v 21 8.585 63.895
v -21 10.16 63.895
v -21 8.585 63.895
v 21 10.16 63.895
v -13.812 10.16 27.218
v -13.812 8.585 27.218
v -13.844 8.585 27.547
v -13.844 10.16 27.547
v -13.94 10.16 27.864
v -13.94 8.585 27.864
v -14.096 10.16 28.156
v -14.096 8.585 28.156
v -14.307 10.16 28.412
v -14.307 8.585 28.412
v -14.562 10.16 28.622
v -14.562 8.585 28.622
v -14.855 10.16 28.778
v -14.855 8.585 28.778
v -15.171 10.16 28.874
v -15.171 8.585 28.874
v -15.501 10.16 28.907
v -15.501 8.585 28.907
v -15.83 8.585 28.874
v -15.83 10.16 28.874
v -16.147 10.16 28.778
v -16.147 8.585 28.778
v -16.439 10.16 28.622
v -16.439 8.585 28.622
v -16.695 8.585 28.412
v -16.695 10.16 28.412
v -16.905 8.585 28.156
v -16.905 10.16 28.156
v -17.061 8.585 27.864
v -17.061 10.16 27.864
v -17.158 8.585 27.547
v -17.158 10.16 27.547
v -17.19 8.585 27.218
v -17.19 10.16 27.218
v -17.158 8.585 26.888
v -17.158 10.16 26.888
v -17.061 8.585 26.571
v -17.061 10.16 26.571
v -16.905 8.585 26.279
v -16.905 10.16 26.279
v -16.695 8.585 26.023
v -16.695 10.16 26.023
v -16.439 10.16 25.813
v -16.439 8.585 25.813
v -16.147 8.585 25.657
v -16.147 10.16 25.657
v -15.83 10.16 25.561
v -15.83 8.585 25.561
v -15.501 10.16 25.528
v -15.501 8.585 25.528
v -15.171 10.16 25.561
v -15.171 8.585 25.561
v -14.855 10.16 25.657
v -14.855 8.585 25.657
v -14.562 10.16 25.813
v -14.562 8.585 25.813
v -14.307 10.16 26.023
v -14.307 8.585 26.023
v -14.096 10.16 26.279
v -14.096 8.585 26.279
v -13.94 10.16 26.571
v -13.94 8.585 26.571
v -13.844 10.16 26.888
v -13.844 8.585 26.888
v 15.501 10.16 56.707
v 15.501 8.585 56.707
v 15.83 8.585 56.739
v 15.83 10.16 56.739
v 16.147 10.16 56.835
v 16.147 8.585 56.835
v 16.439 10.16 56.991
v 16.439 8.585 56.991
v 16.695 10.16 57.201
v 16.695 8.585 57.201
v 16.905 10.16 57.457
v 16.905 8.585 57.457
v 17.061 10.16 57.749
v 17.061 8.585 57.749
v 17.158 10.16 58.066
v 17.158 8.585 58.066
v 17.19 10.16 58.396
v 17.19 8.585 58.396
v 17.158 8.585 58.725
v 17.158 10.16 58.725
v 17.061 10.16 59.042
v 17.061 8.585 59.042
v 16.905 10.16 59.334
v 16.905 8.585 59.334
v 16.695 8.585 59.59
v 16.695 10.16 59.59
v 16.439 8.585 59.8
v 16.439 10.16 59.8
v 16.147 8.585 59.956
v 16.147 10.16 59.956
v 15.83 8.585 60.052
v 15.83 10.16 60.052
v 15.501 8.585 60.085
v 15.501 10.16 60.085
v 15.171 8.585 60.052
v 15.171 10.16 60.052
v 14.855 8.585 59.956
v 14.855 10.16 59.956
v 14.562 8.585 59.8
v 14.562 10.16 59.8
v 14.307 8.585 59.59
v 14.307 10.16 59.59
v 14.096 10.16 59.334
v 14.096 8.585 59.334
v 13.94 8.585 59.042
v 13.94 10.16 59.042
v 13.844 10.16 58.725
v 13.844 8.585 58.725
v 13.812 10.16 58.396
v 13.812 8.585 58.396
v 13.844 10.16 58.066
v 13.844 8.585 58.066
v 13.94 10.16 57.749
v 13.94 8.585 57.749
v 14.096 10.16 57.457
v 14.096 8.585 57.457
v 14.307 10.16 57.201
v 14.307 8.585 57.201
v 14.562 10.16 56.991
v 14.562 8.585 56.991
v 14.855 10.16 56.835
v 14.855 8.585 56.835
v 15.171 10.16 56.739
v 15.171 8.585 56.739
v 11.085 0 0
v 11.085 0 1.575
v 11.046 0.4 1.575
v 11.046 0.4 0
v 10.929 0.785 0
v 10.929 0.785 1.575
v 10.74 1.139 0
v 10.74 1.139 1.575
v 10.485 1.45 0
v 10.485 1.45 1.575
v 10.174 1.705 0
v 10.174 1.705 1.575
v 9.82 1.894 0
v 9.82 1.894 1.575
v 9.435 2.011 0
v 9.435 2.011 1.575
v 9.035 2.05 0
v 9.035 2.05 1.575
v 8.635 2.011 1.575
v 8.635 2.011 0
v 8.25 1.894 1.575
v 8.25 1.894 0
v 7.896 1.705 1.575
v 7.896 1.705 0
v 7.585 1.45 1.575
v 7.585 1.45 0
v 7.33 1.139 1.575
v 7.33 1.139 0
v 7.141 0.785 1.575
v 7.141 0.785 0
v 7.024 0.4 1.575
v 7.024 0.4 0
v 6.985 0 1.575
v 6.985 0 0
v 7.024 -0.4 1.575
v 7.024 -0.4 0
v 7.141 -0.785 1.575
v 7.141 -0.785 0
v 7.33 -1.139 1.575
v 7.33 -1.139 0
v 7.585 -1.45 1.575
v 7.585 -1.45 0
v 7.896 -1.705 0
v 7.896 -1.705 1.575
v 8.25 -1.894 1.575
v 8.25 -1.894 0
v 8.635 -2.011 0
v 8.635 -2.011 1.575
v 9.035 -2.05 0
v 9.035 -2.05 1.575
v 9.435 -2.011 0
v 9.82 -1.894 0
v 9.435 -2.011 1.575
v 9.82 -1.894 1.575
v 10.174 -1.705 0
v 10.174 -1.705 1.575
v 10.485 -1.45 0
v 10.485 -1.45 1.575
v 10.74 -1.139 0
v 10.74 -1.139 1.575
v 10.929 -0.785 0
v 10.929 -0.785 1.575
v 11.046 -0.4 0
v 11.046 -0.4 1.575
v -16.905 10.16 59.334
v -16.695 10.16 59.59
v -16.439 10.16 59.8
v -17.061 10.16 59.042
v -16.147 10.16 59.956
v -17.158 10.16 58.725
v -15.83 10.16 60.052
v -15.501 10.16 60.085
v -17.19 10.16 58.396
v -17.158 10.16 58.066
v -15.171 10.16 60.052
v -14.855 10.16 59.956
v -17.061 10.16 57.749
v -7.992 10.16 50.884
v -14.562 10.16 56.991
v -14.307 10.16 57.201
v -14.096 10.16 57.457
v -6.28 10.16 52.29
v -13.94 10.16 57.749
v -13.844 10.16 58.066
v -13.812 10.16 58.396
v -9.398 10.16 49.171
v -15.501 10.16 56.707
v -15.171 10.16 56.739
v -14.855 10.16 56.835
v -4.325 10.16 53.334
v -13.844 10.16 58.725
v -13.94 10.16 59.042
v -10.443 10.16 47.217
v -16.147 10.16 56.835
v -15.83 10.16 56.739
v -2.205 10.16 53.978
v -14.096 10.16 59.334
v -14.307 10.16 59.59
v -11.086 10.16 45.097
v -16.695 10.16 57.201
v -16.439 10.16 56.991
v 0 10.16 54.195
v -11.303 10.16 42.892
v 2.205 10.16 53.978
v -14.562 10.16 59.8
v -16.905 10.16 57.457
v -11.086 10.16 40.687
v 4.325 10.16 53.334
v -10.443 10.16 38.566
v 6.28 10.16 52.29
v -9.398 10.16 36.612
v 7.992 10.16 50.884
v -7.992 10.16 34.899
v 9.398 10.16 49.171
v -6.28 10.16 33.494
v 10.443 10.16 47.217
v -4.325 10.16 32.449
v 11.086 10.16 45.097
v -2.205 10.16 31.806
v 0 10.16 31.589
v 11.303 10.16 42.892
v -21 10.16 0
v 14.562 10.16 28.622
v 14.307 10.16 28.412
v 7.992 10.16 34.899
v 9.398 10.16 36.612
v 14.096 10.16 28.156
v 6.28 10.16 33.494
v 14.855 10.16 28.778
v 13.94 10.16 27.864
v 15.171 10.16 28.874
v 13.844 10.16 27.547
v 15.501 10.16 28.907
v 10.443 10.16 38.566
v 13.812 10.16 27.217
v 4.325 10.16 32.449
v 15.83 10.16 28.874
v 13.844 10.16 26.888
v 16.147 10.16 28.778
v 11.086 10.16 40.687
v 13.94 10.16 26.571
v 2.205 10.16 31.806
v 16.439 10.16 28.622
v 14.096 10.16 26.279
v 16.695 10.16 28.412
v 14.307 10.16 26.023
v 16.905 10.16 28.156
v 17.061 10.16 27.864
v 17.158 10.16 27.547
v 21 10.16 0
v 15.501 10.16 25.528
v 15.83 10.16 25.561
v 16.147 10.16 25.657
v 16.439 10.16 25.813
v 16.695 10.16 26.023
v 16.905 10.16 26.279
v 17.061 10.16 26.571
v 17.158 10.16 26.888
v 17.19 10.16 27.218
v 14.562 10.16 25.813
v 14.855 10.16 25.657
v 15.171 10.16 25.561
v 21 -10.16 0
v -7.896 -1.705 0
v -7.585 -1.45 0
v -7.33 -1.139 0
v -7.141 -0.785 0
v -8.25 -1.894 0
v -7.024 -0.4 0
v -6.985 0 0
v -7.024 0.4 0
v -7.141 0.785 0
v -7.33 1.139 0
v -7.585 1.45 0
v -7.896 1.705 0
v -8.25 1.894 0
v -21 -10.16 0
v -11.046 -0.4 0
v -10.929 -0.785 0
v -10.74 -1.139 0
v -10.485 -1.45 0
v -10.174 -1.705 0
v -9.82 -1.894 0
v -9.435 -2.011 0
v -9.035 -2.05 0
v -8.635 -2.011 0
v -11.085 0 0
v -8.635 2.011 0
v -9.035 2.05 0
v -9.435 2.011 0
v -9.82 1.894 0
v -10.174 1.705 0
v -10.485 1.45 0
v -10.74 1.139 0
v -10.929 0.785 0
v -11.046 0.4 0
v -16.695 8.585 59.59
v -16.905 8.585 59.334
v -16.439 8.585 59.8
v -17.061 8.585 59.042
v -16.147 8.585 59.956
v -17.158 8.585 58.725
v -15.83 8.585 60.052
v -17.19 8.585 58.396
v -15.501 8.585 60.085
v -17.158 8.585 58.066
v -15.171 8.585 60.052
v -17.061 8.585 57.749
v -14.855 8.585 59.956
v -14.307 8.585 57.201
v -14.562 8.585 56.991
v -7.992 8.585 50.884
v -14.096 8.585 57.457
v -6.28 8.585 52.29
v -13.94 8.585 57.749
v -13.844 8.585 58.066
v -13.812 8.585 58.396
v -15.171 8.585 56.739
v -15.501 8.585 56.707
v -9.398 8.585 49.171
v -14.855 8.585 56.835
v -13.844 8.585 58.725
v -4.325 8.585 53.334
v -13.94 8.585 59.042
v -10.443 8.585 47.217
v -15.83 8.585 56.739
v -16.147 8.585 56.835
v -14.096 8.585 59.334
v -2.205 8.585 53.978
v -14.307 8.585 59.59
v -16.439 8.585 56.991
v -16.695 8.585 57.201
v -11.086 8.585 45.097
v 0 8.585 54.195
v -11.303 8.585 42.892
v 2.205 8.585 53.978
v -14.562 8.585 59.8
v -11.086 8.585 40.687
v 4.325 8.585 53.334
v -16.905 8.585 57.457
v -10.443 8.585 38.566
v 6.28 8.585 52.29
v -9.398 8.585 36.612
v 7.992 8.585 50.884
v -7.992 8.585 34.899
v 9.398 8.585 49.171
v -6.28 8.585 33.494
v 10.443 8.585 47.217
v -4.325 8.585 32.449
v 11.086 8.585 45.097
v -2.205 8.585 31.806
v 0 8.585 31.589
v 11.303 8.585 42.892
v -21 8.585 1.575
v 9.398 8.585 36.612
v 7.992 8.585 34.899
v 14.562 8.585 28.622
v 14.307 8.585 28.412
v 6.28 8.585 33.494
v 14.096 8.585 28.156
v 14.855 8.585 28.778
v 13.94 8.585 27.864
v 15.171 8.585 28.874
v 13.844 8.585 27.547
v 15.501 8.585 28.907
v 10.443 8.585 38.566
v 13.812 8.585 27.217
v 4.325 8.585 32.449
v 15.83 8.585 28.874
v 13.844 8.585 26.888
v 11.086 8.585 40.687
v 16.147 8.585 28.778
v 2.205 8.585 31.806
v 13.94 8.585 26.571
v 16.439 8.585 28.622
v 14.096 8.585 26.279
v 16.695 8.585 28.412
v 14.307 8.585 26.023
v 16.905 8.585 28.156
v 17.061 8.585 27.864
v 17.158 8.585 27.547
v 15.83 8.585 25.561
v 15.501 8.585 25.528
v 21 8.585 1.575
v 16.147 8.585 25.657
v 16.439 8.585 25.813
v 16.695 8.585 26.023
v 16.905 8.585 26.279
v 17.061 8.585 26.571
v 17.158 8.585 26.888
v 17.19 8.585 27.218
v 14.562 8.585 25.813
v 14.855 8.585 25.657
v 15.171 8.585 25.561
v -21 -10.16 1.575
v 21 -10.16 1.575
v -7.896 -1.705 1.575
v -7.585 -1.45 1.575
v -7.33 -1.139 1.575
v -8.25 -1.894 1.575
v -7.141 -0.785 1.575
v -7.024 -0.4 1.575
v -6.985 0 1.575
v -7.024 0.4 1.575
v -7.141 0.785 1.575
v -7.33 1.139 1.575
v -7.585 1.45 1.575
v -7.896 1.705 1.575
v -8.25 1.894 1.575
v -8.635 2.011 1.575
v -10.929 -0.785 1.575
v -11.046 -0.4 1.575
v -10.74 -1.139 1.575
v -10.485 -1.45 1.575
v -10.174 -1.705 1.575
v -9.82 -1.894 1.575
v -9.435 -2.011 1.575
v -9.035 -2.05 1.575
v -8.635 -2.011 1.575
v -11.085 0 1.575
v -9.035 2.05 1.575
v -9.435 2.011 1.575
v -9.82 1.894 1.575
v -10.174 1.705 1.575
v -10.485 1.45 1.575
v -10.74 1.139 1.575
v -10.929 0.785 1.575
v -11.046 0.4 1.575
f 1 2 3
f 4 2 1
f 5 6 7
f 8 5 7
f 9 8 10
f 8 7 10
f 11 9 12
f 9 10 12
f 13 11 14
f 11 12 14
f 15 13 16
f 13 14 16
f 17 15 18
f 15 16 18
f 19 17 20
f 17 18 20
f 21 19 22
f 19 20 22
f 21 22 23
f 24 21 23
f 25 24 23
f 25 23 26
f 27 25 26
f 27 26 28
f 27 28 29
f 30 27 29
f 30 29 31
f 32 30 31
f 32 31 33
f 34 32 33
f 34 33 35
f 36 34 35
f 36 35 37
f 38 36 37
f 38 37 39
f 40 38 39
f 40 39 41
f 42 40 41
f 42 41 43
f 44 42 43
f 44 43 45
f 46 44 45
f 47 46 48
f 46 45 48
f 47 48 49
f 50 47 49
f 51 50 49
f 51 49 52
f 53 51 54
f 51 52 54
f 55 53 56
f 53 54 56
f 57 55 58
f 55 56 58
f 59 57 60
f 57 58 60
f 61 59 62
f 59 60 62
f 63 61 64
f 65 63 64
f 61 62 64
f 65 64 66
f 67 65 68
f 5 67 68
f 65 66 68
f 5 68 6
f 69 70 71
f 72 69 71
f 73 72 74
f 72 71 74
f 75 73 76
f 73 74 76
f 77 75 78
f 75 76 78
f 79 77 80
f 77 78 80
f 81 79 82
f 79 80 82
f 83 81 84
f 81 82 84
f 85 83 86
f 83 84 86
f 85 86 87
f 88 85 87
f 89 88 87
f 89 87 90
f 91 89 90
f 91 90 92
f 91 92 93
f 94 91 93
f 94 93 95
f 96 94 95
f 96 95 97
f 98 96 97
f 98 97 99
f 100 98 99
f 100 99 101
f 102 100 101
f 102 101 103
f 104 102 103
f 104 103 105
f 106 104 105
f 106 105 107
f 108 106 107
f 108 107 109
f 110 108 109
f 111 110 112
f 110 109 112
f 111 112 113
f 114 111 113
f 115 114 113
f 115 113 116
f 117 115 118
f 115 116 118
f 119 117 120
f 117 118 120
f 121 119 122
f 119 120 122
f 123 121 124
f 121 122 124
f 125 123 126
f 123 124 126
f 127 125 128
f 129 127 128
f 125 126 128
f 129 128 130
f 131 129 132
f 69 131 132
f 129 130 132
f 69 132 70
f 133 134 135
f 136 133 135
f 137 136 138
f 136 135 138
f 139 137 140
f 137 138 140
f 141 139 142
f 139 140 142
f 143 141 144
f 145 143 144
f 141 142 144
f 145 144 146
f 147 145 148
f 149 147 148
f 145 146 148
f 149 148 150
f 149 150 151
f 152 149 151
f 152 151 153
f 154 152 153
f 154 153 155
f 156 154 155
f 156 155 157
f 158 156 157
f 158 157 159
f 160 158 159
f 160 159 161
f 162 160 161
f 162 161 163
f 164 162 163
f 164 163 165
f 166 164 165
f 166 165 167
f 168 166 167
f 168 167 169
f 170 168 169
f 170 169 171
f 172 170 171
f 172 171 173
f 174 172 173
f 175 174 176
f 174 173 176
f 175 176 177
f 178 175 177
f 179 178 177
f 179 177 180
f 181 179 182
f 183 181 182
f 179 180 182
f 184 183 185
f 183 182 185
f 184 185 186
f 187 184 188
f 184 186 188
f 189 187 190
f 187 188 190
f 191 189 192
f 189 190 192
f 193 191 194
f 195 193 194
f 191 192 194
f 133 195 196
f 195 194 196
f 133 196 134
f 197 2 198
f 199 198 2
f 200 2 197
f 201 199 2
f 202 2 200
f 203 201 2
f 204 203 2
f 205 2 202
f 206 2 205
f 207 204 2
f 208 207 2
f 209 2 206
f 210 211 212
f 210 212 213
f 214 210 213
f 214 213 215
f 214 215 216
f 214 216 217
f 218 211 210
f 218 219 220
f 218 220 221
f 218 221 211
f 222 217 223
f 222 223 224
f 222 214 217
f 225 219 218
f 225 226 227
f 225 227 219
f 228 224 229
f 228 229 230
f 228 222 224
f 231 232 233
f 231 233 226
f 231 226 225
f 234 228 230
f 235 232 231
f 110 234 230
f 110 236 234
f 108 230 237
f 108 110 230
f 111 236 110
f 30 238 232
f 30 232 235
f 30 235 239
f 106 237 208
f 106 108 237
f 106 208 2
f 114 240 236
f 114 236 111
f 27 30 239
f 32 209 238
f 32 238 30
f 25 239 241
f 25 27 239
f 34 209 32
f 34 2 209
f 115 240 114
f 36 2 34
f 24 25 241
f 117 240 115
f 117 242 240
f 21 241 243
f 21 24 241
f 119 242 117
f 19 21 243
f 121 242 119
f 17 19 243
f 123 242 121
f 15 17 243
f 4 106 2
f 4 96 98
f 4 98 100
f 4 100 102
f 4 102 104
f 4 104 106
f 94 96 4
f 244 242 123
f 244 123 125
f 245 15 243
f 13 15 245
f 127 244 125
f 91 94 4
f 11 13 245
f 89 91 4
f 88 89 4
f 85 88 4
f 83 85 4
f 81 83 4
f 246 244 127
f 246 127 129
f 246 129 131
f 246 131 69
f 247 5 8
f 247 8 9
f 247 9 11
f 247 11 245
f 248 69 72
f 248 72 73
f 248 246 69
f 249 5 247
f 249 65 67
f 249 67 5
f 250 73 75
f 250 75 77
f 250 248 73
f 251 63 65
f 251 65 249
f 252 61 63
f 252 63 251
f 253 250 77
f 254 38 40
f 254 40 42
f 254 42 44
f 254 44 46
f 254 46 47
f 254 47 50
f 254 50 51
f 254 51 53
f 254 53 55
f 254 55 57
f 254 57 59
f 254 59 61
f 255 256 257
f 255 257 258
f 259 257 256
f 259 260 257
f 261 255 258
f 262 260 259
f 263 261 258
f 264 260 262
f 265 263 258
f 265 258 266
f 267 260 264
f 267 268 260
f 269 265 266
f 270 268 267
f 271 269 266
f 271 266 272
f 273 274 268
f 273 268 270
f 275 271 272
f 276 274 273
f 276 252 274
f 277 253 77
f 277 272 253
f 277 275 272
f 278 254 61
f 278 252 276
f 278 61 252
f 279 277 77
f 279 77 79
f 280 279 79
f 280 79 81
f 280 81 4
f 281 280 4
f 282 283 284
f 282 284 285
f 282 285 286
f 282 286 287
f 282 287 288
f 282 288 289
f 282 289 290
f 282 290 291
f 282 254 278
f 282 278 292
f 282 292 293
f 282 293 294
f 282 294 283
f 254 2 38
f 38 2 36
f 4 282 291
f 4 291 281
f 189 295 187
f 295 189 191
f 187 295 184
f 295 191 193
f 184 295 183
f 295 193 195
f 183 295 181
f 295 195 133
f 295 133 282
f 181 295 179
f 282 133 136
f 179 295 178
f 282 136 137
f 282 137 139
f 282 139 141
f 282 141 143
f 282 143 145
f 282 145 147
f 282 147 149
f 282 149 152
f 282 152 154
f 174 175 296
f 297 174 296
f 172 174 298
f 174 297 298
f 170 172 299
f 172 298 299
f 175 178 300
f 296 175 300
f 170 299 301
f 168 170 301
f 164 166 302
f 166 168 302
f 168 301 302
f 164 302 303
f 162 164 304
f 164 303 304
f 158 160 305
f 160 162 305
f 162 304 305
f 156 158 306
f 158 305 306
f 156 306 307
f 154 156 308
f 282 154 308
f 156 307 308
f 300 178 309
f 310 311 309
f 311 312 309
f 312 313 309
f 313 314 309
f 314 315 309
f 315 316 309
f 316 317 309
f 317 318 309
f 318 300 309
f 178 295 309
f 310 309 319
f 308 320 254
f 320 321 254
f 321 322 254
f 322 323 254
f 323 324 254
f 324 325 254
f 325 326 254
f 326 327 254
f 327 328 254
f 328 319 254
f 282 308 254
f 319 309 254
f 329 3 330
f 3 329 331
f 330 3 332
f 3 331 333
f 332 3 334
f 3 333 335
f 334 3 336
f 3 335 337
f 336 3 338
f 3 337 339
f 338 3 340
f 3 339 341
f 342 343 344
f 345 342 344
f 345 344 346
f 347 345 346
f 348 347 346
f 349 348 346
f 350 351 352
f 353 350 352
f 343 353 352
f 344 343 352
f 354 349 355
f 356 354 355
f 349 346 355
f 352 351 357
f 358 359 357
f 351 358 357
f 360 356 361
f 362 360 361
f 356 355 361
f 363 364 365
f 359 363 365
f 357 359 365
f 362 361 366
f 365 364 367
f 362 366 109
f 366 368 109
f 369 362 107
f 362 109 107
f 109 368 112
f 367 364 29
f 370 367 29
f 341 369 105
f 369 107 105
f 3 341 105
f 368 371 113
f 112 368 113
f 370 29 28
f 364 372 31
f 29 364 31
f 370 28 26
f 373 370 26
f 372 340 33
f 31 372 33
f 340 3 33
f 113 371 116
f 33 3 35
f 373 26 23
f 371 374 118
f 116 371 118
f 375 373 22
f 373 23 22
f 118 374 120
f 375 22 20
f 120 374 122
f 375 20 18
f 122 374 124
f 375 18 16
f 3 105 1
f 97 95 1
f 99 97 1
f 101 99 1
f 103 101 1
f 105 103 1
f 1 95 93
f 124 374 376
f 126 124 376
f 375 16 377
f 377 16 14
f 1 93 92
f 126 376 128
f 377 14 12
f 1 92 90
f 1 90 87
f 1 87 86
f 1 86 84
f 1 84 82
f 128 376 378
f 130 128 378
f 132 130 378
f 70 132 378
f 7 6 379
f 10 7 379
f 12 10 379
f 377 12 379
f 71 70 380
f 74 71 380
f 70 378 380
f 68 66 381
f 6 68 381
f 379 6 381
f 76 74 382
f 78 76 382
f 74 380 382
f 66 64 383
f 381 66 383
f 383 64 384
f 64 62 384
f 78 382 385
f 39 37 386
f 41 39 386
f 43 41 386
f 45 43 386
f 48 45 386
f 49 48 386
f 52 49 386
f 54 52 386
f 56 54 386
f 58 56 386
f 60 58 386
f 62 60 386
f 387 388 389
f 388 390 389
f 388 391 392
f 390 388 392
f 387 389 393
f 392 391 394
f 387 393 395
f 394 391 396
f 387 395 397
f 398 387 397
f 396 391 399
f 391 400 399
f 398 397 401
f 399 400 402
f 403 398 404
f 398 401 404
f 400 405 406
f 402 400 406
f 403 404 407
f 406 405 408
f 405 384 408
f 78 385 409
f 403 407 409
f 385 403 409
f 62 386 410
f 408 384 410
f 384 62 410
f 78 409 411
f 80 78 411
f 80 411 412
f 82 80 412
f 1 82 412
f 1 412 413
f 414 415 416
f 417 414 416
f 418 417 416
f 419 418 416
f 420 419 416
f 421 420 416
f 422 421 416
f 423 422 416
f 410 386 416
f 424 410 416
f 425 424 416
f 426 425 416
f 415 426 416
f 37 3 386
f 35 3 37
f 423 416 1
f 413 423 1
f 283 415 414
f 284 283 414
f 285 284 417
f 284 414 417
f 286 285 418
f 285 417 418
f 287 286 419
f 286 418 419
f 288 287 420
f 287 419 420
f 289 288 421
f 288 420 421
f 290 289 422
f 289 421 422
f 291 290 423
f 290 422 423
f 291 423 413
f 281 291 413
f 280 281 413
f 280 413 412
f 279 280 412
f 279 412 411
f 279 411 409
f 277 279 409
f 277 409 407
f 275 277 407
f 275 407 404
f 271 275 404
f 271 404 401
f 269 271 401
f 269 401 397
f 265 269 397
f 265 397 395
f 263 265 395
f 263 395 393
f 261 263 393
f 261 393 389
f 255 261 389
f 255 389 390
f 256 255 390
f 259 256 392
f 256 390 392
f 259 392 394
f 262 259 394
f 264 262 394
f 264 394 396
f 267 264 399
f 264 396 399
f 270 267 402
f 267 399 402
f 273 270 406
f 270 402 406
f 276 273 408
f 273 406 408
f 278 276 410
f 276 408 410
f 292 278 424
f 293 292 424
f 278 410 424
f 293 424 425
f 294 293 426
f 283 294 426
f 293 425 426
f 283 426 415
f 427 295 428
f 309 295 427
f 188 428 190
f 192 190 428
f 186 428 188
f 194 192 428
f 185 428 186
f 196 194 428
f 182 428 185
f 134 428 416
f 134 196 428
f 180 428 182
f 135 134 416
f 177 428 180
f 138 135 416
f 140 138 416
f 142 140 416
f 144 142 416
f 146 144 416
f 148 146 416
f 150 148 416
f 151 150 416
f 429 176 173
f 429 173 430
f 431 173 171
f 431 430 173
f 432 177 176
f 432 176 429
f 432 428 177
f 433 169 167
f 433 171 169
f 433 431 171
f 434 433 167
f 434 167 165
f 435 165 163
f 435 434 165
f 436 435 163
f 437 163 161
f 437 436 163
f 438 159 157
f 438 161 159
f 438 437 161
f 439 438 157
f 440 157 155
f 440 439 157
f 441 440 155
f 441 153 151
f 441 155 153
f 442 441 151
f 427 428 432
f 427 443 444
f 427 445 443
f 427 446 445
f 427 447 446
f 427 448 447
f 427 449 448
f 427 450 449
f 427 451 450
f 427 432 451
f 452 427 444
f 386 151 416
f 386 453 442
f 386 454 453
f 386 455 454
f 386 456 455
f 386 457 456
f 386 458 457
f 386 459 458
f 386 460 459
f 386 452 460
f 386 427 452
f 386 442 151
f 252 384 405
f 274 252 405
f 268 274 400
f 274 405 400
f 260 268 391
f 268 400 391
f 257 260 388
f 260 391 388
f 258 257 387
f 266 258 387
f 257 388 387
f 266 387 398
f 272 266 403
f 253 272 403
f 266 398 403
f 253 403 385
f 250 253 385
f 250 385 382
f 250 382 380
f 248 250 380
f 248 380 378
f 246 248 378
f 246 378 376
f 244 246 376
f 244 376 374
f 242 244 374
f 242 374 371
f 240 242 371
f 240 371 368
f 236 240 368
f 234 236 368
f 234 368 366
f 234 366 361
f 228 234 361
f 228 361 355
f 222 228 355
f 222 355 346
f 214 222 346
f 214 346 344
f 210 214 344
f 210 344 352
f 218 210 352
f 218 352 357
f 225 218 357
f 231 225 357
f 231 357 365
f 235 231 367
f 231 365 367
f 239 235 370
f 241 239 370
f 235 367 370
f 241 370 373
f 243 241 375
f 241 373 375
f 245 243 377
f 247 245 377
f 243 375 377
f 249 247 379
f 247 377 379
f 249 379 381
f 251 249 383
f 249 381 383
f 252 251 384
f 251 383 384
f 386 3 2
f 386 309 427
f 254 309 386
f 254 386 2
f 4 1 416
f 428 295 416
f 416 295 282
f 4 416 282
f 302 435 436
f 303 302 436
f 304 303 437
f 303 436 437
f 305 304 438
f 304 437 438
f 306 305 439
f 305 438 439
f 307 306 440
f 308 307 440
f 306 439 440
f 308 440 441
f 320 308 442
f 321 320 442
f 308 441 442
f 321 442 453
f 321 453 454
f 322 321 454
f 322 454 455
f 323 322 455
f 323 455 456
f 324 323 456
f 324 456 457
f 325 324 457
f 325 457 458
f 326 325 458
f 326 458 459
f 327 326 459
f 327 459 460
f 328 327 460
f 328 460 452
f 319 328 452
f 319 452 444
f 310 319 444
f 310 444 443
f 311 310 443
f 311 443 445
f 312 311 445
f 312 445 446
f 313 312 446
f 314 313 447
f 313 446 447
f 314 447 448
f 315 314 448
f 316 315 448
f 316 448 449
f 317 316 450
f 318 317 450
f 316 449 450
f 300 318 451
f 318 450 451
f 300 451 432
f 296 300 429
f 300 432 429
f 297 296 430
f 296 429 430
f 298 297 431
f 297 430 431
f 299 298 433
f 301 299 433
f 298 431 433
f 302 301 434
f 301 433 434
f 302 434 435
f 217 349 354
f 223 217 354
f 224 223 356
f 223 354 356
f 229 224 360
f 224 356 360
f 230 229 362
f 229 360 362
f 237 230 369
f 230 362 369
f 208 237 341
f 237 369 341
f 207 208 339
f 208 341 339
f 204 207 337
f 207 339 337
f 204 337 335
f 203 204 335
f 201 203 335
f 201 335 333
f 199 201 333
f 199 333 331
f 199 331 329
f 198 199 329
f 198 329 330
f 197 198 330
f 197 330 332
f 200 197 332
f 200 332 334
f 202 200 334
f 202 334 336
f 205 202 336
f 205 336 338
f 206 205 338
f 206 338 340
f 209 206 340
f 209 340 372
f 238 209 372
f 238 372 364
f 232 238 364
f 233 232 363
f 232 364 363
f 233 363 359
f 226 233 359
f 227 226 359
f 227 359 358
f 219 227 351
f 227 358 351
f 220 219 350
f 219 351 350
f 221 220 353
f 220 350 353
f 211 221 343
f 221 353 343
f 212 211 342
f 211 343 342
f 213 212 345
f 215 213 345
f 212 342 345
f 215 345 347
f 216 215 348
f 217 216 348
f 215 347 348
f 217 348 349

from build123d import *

# Parameters (mm, degrees)
SKETCH1_W           = 20.32
SKETCH1_H           = 42
BOSS_EXTRUDE1_DEPTH = 1.5748
SKETCH2_W           = 42
SKETCH2_H           = 1.5748
BOSS_EXTRUDE2_DEPTH = 62.32
SKETCH3_R           = 11.303
SKETCH3_R_2         = 1.6891
CUT_EXTRUDE1_DEPTH  = 62.32
SKETCH4_R           = 2.05
CUT_EXTRUDE2_DEPTH  = 62.32


with BuildPart() as part:
    # Sketch1 → Boss-Extrude1 (new body)
    with BuildSketch(Plane(origin=(0, 0, 0), x_dir=(0, 1, 0), z_dir=(0, 0, 1))):
        Rectangle(SKETCH1_W, SKETCH1_H)
    extrude(amount=BOSS_EXTRUDE1_DEPTH)

    # Sketch2 → Boss-Extrude2 (add)
    with BuildSketch(Plane.XY.offset(1.5748)):
        with Locations((0, 9.3726)):
            Rectangle(SKETCH2_W, SKETCH2_H)
    extrude(amount=BOSS_EXTRUDE2_DEPTH)

    # Sketch3 → Cut-Extrude1 (cut)
    with BuildSketch(Plane(origin=(0, 8.5852, 0), x_dir=(-1, 0, 0), z_dir=(0, -1, 0))):
        with Locations(Location((0, -42.8918, 0), (0, 0, 90))):
            Circle(SKETCH3_R)
        with Locations(Location((-15.5009, -58.3957, 0), (0, 0, 90))):
            Circle(SKETCH3_R_2)
        with Locations(Location((-15.5009, -27.2175, 0), (0, 0, 90))):
            Circle(SKETCH3_R_2)
        with Locations(Location((15.5009, -27.2175, 0), (0, 0, 180))):
            Circle(SKETCH3_R_2)
        with Locations(Location((15.5009, -58.3957, 0), (0, 0, 180))):
            Circle(SKETCH3_R_2)
    extrude(amount=-CUT_EXTRUDE1_DEPTH, mode=Mode.SUBTRACT)

    # Sketch4 → Cut-Extrude2 (cut)
    with BuildSketch(Plane.XY.offset(1.5748)):
        with Locations((9.035, 0)):
            Circle(SKETCH4_R)
        with Locations((-9.035, 0)):
            Circle(SKETCH4_R)
    extrude(amount=-CUT_EXTRUDE2_DEPTH, mode=Mode.SUBTRACT)


solid = part.part
